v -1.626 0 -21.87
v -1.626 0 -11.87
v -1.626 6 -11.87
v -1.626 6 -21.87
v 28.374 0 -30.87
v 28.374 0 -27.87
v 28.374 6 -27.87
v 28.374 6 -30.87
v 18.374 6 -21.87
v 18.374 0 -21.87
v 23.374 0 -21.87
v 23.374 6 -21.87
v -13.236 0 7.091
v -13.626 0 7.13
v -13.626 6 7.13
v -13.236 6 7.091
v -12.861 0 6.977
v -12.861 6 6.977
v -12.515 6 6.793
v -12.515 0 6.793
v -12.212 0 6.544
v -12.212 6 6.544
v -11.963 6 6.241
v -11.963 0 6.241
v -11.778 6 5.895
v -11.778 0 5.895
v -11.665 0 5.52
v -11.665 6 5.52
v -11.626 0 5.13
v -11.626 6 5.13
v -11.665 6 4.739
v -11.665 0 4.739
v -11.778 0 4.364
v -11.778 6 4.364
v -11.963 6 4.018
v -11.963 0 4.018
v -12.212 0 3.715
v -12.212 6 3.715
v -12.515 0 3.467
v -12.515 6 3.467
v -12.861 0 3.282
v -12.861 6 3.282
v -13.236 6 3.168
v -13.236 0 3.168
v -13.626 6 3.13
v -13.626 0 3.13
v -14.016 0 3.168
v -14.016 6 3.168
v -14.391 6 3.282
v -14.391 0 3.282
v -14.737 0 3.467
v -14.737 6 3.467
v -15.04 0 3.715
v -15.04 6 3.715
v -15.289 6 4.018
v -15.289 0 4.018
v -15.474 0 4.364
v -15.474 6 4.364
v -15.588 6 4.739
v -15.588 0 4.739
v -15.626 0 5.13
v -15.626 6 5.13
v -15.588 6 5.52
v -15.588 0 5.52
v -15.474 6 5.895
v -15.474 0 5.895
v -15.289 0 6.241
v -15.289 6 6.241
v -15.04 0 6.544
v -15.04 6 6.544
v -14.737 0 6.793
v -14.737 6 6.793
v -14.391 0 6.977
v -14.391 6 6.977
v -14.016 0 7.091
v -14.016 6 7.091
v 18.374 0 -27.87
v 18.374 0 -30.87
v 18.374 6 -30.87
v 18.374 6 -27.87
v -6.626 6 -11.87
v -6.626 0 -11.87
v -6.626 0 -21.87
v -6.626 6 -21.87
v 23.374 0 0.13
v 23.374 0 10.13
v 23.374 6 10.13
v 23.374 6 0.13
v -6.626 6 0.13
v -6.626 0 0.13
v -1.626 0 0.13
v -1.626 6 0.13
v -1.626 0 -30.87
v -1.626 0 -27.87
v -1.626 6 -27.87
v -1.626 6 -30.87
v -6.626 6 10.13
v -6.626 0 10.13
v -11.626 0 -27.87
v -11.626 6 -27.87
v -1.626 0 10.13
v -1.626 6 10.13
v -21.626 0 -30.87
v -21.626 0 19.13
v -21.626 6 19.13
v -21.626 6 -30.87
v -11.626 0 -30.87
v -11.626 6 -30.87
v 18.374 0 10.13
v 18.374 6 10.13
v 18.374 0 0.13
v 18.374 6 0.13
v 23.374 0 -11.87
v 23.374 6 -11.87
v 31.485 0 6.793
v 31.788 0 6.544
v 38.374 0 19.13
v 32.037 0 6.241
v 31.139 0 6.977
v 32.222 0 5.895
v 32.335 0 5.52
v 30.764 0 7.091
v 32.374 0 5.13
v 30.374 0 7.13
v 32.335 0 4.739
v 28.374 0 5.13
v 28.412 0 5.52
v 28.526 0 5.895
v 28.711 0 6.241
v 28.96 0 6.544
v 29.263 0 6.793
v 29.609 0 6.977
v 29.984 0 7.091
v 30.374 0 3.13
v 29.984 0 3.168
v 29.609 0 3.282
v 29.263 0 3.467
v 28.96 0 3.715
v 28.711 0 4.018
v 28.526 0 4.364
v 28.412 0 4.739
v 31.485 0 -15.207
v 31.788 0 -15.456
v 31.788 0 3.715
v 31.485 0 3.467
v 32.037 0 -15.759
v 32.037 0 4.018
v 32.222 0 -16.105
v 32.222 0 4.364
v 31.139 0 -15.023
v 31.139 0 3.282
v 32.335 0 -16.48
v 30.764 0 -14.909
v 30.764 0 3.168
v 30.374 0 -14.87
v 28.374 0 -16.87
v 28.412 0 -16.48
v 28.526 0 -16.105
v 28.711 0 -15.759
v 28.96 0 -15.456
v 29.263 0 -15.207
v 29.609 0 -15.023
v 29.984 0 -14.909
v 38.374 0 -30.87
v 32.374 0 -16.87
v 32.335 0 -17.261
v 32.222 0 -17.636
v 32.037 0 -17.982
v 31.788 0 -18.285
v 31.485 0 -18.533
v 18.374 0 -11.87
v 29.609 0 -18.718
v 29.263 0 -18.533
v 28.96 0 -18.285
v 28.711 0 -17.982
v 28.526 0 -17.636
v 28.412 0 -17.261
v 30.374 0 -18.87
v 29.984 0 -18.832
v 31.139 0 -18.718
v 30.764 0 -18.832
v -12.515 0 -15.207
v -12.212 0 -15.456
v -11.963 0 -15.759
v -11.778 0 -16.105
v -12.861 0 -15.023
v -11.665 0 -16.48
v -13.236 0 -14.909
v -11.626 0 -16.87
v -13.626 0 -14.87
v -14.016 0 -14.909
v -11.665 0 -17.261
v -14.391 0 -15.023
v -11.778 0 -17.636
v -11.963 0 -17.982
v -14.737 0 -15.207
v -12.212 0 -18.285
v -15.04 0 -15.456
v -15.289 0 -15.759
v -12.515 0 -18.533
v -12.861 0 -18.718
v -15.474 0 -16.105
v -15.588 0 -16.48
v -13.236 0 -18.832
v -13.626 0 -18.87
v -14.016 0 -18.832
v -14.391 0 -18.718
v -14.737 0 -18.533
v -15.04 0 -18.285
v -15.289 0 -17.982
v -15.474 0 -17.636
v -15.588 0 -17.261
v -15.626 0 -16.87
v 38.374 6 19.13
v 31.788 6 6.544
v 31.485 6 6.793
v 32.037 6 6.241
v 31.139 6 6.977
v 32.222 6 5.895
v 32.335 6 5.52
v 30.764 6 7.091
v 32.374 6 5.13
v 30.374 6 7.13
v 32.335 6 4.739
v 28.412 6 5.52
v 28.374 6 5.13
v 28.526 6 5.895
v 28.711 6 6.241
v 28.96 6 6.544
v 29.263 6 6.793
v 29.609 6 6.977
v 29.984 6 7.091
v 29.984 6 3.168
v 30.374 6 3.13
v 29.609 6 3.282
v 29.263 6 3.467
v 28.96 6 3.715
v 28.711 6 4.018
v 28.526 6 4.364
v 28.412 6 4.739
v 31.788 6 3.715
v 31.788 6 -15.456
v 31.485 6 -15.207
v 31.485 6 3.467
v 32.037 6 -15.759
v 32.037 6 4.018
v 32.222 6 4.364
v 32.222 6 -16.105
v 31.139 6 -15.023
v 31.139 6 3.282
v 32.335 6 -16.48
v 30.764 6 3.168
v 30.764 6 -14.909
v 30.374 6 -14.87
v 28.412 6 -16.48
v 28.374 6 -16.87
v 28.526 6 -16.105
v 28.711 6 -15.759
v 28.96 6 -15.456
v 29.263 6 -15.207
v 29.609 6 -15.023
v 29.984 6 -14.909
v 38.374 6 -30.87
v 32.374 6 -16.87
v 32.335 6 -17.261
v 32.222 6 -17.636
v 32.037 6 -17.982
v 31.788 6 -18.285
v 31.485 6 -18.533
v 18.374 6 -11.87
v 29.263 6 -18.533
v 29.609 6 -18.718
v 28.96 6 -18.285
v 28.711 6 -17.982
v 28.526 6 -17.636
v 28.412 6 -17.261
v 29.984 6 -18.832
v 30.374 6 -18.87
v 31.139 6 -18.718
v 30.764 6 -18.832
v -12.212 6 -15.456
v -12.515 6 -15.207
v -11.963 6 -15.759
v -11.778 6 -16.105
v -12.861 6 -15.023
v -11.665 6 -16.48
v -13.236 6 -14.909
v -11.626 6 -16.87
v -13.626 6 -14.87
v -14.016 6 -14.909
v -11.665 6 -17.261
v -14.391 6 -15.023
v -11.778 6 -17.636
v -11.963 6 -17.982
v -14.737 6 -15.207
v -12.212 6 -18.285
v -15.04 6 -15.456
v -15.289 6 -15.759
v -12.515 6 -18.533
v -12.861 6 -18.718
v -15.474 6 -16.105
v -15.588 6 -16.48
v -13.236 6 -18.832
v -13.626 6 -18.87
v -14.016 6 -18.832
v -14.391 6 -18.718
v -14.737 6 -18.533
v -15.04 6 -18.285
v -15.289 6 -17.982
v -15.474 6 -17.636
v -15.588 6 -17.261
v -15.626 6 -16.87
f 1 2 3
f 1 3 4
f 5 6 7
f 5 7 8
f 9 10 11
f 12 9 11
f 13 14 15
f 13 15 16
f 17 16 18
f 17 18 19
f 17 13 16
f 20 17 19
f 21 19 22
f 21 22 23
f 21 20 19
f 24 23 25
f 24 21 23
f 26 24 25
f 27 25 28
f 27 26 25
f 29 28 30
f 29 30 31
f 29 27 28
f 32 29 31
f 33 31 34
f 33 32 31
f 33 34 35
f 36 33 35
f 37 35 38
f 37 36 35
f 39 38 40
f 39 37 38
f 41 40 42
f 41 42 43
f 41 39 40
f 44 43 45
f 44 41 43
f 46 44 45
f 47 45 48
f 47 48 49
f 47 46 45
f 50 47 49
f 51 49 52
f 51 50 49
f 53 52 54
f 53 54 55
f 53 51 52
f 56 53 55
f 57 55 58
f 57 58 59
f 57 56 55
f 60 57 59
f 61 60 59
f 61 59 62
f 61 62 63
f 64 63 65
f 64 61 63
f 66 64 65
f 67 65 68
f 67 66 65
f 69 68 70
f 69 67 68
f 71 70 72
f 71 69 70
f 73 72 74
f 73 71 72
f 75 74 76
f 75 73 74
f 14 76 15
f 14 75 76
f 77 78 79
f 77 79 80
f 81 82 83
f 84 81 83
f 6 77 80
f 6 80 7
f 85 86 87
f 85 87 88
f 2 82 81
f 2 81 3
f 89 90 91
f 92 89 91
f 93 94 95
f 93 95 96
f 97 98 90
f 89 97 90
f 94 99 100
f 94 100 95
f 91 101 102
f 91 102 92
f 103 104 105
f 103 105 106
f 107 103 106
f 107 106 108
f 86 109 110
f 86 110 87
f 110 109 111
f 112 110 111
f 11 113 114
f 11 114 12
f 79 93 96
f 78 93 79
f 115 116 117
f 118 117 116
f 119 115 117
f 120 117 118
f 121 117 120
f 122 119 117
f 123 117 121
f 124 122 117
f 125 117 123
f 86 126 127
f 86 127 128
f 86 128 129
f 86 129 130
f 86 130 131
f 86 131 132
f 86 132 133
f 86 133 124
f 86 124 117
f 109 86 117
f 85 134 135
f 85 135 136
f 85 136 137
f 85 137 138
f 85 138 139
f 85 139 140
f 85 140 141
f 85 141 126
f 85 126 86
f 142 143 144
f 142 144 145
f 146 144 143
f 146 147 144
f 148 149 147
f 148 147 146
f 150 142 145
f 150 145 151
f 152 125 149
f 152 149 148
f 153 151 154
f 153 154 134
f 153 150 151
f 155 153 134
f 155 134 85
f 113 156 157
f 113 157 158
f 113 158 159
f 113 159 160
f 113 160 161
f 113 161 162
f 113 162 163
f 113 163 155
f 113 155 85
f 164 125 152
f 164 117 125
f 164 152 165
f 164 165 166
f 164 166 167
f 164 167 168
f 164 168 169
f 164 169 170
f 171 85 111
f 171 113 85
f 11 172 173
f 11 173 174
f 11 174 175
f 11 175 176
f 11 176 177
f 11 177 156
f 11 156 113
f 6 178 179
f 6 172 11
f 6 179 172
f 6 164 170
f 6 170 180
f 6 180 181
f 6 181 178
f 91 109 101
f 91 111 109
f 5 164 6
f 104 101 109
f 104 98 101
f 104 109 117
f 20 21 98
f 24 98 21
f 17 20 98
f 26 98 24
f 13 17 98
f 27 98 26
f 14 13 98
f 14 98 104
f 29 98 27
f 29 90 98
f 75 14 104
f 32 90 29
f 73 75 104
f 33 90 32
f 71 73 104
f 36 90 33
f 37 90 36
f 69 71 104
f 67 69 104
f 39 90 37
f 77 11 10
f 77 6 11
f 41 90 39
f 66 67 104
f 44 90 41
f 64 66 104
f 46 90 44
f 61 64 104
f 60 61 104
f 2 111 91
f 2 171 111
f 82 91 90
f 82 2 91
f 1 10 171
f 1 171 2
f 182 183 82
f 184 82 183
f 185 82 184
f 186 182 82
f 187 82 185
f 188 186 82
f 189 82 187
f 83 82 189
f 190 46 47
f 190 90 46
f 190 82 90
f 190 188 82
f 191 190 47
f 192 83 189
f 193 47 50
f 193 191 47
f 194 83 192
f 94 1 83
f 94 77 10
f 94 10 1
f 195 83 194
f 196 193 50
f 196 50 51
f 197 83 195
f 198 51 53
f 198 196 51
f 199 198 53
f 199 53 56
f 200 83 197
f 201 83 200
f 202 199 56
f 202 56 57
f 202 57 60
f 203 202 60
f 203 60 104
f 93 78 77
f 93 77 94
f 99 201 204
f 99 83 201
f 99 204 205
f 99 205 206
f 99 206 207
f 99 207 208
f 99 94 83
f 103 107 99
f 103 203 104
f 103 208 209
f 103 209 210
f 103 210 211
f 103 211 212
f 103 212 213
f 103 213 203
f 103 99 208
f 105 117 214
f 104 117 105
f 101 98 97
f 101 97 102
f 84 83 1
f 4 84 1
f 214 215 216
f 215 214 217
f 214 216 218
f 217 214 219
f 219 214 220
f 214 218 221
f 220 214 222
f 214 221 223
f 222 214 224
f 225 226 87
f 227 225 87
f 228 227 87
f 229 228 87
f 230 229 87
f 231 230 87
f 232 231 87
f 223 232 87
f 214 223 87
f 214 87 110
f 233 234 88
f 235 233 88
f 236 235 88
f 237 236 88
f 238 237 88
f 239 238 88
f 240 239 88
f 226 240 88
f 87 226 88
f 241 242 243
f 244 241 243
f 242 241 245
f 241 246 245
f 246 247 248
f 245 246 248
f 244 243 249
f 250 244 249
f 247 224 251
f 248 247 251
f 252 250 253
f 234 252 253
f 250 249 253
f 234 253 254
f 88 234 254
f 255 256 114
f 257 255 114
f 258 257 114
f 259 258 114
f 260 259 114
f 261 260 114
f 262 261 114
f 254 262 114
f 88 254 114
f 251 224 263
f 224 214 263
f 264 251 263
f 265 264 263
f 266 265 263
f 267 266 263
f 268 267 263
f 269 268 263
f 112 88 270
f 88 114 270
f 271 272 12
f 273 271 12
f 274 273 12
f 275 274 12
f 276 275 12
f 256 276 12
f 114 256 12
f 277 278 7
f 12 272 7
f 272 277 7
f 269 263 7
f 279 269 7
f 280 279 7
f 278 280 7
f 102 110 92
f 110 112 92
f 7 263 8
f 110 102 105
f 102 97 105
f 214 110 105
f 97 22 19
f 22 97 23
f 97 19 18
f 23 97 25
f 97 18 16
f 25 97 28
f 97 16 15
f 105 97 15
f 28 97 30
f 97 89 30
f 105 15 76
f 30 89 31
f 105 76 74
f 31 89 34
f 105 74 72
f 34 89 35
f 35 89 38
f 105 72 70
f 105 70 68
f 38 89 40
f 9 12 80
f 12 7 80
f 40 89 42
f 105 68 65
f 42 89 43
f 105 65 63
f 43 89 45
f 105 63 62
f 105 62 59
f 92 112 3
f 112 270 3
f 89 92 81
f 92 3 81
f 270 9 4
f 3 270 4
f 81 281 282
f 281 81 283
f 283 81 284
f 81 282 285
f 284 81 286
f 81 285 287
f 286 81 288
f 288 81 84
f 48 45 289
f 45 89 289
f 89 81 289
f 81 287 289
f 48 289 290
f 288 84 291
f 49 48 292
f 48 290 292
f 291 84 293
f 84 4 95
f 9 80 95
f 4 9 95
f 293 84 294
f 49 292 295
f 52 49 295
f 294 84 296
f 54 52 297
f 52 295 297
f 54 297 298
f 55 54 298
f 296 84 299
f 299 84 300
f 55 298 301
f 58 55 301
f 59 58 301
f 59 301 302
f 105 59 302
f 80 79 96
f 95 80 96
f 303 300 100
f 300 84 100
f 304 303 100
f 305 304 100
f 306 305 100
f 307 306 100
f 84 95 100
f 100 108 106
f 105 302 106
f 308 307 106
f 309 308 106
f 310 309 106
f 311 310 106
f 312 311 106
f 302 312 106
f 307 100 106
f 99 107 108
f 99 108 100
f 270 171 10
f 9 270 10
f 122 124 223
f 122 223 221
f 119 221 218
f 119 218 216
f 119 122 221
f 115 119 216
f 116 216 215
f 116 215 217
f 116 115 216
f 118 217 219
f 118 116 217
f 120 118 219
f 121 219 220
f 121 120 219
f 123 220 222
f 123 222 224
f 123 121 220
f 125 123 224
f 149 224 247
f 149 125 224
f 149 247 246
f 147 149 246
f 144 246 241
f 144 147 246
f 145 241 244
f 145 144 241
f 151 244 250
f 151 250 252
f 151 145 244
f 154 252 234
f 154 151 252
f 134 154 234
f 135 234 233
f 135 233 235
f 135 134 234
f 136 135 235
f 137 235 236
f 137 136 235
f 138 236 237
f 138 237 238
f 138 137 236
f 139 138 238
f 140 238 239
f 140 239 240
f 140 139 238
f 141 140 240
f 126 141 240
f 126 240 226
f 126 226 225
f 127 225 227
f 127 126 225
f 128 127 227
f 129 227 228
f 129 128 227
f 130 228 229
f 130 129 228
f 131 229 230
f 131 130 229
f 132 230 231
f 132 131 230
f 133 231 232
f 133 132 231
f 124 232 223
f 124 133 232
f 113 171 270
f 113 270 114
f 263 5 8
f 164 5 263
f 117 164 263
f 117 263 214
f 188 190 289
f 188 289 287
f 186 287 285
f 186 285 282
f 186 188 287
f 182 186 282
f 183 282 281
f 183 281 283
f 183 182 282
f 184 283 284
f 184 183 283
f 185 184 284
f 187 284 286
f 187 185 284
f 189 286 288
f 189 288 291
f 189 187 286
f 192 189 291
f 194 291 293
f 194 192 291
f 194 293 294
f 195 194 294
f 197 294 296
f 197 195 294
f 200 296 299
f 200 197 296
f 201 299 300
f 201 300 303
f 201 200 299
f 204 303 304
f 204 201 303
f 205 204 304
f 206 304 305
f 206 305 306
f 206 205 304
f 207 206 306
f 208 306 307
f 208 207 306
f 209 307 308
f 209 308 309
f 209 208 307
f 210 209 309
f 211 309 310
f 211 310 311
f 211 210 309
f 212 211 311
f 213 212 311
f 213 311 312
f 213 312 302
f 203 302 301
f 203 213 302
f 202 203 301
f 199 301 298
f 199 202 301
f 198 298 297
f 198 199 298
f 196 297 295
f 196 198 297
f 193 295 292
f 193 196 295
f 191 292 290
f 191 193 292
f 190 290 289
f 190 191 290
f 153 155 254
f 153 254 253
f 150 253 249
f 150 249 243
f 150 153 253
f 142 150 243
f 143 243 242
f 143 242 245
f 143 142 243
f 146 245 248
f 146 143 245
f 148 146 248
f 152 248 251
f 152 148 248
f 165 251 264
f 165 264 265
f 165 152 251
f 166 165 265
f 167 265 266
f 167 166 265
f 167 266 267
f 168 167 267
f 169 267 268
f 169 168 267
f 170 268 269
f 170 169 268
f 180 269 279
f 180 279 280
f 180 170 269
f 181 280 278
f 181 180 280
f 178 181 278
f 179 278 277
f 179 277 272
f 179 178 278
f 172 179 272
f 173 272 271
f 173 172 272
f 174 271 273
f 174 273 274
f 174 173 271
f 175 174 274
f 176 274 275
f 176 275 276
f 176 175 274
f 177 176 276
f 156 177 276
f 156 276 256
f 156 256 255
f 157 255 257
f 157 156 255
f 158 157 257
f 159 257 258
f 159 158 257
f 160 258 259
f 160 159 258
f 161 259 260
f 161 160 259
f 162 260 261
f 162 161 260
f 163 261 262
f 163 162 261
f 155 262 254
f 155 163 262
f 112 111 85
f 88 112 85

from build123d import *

# Parameters (mm, degrees)
SKETCH2_R           = 2
SKETCH2_W           = 5
SKETCH2_H           = 10
BOSS_EXTRUDE1_DEPTH = 6


with BuildPart() as part:
    # Sketch2 → Boss-Extrude1 (new body)
    with BuildSketch(Plane(origin=(0, 0, 0), x_dir=(1, 0, 0), z_dir=(0, 1, 0))):
        Polygon((-21.626106175, 30.870423783), (-11.626106175, 30.870423783), (-11.626106175, 27.870423783), (-1.626106175, 27.870423783), (-1.626106175, 30.870423783), (18.373893825, 30.870423783), (18.373893825, 27.870423783), (28.373893825, 27.870423783), (28.373893825, 30.870423783), (38.373893825, 30.870423783), (38.373893825, -19.129576217), (-21.626106175, -19.129576217), align=None)
        with Locations(Location((-13.626106175, 16.870423783, 0), (0, 0, 270))):
            Circle(SKETCH2_R, mode=Mode.SUBTRACT)
        with Locations(Location((-13.626106175, -5.129576217, 0), (0, 0, 270))):
            Circle(SKETCH2_R, mode=Mode.SUBTRACT)
        with Locations(Location((30.373893825, 16.870423783, 0), (0, 0, 270))):
            Circle(SKETCH2_R, mode=Mode.SUBTRACT)
        with Locations(Location((30.373893825, -5.129576217, 0), (0, 0, 270))):
            Circle(SKETCH2_R, mode=Mode.SUBTRACT)
        with Locations((20.873893825, 16.870423783)):
            Rectangle(SKETCH2_W, SKETCH2_H, mode=Mode.SUBTRACT)
        with Locations((-4.126106175, 16.870423783)):
            Rectangle(SKETCH2_W, SKETCH2_H, mode=Mode.SUBTRACT)
        with Locations((-4.126106175, -5.129576217)):
            Rectangle(SKETCH2_W, SKETCH2_H, mode=Mode.SUBTRACT)
        with Locations((20.873893825, -5.129576217)):
            Rectangle(SKETCH2_W, SKETCH2_H, mode=Mode.SUBTRACT)
    extrude(amount=BOSS_EXTRUDE1_DEPTH)


solid = part.part
